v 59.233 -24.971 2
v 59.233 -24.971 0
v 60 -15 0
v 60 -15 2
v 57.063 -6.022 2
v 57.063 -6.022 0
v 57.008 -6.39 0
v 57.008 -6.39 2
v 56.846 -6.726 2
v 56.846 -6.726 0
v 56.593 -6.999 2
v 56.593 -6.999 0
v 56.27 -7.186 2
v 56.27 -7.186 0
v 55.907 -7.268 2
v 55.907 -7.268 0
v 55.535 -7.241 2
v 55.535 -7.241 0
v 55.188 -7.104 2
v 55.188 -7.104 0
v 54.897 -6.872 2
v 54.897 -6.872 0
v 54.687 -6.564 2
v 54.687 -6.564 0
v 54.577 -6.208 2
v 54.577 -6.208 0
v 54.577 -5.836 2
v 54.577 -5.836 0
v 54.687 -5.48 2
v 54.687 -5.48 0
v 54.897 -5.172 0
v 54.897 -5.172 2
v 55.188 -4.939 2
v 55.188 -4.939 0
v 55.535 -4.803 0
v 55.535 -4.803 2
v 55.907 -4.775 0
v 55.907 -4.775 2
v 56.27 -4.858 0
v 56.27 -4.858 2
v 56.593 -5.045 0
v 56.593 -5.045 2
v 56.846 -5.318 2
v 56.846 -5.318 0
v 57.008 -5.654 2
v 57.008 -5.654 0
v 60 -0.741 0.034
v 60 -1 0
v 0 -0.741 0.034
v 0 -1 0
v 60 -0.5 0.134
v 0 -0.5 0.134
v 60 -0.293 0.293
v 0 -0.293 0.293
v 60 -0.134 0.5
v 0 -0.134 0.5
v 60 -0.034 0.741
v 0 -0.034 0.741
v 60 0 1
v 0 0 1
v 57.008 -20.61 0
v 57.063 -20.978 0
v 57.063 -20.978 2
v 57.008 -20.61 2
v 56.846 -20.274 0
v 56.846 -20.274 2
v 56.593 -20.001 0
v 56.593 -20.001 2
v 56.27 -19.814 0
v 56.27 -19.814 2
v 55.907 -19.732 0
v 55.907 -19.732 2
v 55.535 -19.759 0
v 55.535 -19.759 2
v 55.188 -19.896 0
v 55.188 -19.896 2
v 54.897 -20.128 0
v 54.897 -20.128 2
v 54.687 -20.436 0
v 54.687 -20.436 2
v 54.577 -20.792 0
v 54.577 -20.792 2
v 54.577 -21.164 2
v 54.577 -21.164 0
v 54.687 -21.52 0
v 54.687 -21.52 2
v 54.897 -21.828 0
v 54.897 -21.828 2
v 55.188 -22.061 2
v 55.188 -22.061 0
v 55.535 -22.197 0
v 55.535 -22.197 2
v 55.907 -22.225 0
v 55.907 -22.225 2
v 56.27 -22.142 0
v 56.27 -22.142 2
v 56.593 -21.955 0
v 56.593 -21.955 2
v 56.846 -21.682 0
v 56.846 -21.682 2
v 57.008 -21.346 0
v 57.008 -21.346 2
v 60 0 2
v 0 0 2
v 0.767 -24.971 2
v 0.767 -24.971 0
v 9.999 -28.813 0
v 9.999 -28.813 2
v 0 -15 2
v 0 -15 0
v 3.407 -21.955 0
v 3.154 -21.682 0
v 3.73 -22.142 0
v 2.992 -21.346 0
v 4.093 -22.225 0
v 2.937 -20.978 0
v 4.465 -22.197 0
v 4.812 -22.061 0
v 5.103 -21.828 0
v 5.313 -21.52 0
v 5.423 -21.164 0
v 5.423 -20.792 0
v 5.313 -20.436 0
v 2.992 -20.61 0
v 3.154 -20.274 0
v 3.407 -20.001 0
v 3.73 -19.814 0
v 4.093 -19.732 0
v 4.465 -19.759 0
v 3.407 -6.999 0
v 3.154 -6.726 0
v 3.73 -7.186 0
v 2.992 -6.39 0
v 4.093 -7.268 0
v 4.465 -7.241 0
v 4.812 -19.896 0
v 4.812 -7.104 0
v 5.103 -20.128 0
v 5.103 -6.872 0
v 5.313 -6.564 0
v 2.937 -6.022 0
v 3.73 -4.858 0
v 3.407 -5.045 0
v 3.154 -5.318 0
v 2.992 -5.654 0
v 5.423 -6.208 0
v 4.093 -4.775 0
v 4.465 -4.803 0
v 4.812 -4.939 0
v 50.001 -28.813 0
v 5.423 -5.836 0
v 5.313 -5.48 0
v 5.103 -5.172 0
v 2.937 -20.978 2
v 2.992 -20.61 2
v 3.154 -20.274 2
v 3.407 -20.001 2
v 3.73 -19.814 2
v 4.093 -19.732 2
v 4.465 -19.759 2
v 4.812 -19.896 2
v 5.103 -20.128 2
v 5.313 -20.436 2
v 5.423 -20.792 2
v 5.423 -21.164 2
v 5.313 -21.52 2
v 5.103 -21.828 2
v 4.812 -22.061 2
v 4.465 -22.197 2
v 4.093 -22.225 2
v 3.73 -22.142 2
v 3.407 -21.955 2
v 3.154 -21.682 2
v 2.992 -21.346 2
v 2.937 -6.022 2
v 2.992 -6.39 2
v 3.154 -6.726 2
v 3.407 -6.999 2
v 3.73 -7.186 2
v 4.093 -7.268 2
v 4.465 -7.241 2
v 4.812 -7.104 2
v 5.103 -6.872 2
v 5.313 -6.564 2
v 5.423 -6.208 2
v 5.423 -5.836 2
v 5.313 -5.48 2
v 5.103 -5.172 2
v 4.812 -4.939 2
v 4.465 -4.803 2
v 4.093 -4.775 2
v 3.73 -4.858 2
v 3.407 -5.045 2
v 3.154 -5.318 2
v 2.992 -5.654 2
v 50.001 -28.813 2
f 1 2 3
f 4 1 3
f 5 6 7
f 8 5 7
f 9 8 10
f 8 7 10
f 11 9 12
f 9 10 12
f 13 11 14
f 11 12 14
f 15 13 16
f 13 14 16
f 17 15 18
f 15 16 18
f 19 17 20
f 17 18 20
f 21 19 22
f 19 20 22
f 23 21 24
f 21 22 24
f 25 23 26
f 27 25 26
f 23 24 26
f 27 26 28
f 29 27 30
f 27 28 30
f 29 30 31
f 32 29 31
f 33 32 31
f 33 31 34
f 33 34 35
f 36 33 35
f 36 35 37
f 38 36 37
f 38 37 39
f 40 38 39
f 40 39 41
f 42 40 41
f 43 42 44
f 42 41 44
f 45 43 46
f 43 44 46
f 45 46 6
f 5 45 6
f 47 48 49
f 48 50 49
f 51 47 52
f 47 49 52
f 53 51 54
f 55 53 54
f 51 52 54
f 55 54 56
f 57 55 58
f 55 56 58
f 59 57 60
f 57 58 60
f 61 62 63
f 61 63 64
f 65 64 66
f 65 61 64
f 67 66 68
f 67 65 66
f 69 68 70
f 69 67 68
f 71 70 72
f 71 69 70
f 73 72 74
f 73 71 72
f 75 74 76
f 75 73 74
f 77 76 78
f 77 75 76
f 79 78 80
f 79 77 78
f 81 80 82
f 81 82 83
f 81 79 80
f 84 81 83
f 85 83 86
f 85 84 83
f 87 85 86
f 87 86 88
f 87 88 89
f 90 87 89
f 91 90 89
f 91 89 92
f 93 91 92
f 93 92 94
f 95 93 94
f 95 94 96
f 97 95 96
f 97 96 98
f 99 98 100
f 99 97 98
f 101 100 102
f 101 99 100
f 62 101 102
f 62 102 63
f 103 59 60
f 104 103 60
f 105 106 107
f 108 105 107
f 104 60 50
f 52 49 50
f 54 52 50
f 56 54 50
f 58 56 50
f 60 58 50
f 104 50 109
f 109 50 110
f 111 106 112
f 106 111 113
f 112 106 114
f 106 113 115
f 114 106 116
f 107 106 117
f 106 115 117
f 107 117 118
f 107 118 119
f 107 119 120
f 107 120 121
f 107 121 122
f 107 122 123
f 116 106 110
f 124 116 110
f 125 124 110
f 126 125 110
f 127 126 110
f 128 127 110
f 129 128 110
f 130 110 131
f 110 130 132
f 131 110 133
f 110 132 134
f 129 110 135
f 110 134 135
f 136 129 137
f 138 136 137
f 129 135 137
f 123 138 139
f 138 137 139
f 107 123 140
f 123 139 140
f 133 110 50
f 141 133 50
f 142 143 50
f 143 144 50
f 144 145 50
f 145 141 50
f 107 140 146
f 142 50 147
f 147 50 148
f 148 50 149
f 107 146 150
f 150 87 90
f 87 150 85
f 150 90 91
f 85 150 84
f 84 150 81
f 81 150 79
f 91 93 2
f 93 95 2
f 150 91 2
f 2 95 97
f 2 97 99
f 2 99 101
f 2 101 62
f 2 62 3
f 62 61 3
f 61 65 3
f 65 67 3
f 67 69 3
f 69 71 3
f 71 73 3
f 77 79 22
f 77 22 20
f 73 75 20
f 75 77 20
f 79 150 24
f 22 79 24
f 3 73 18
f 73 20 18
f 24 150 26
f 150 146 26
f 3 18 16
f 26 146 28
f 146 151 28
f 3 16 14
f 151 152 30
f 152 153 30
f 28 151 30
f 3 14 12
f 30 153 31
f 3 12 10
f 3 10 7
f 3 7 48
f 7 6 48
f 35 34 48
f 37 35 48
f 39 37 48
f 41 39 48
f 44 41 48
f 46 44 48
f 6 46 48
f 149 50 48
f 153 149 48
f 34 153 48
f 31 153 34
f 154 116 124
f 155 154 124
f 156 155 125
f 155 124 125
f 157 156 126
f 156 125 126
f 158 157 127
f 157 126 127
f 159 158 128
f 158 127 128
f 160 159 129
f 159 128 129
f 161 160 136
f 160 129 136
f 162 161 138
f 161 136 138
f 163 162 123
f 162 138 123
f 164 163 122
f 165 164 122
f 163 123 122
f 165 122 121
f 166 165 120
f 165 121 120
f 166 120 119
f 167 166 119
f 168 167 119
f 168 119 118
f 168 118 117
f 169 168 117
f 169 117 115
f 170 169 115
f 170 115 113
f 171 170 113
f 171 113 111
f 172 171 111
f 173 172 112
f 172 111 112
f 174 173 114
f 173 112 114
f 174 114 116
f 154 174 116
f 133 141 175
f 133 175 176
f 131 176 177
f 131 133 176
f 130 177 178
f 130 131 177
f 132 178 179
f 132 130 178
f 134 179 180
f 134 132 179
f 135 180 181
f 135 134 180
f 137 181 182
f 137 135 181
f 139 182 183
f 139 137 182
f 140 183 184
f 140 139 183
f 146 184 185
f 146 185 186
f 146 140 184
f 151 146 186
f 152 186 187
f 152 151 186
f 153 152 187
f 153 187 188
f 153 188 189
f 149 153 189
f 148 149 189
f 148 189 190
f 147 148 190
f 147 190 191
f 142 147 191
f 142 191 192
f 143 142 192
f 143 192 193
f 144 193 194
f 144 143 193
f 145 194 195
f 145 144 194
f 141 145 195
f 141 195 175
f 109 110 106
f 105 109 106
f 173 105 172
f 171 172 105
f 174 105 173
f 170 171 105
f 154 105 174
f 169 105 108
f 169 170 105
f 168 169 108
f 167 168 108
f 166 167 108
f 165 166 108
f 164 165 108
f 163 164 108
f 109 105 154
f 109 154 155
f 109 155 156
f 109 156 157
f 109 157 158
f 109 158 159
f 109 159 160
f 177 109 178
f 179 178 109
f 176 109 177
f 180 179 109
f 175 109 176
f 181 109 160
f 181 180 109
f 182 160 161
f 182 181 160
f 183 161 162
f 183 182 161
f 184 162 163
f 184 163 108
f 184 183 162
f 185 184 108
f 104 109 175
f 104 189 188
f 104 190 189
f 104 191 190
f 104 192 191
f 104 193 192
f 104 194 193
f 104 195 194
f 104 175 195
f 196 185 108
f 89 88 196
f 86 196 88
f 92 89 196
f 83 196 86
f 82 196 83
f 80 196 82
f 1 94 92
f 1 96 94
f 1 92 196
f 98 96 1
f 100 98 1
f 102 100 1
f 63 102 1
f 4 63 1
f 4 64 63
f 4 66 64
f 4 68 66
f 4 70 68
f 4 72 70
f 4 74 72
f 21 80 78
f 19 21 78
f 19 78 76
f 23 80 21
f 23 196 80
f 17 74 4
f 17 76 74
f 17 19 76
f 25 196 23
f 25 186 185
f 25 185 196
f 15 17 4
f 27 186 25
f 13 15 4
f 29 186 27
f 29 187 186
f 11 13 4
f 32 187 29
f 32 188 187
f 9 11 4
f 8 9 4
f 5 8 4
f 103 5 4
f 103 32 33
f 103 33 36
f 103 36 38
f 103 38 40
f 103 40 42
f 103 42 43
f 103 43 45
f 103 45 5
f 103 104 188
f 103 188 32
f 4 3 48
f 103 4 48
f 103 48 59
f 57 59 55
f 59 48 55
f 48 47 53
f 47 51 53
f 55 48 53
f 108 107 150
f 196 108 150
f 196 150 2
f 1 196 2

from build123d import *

# Parameters (mm, degrees)
BOSS_EXTRUDE1_DEPTH     = 2
SKETCH2_R               = 1.25
CUT_EXTRUDE1_DEPTH      = 2
MIRROR3_COPY_1_SKETCH_R = 1.25
MIRROR3_COPY_1_DEPTH    = 2
FILLET1_R               = 1


with BuildPart() as part:
    # Sketch1 → Boss-Extrude1 (new body)
    with BuildSketch(Plane.XY):
        Polygon((0.767190281, -24.970527522), (9.999292452, -28.813480749), (50.000707548, -28.813480749), (59.232809719, -24.970527522), (60, -15), (60, 0), (0, 0), (0, -15), align=None)
    extrude(amount=BOSS_EXTRUDE1_DEPTH)

    # Sketch2 → Cut-Extrude1 (cut)
    with BuildSketch(Plane(origin=(0, 0, 0), x_dir=(-1, 0, 0), z_dir=(0, 0, -1))):
        with Locations((-4.186666378, -20.978033438)):
            Circle(SKETCH2_R)
    cut_extrude1 = extrude(amount=-CUT_EXTRUDE1_DEPTH, mode=Mode.SUBTRACT)

    # Mirror2: Cut-Extrude1 across plane
    add(cut_extrude1.mirror(Plane(origin=(30, 0, 0), x_dir=(0, 0, 1), z_dir=(1, 0, 0))), mode=Mode.SUBTRACT)

    # Mirror3: Cut-Extrude1 across plane
    add(cut_extrude1.mirror(Plane.ZX.offset(-13.5)), mode=Mode.SUBTRACT)

    # Mirror3 copy 1 sketch → Mirror3 copy 1 (cut)
    with BuildSketch(Plane(origin=(60, -27, 0), x_dir=(1, 0, 0), z_dir=(0, 0, -1))):
        with Locations((-4.186666378, -20.978033438)):
            Circle(MIRROR3_COPY_1_SKETCH_R)
    extrude(amount=-MIRROR3_COPY_1_DEPTH, mode=Mode.SUBTRACT)

    # Fillet1
    fillet1_edges = [part.edges().sort_by_distance(p)[0] for p in [
        (30, 0, 0),
    ]]
    fillet(fillet1_edges, radius=FILLET1_R)


solid = part.part
